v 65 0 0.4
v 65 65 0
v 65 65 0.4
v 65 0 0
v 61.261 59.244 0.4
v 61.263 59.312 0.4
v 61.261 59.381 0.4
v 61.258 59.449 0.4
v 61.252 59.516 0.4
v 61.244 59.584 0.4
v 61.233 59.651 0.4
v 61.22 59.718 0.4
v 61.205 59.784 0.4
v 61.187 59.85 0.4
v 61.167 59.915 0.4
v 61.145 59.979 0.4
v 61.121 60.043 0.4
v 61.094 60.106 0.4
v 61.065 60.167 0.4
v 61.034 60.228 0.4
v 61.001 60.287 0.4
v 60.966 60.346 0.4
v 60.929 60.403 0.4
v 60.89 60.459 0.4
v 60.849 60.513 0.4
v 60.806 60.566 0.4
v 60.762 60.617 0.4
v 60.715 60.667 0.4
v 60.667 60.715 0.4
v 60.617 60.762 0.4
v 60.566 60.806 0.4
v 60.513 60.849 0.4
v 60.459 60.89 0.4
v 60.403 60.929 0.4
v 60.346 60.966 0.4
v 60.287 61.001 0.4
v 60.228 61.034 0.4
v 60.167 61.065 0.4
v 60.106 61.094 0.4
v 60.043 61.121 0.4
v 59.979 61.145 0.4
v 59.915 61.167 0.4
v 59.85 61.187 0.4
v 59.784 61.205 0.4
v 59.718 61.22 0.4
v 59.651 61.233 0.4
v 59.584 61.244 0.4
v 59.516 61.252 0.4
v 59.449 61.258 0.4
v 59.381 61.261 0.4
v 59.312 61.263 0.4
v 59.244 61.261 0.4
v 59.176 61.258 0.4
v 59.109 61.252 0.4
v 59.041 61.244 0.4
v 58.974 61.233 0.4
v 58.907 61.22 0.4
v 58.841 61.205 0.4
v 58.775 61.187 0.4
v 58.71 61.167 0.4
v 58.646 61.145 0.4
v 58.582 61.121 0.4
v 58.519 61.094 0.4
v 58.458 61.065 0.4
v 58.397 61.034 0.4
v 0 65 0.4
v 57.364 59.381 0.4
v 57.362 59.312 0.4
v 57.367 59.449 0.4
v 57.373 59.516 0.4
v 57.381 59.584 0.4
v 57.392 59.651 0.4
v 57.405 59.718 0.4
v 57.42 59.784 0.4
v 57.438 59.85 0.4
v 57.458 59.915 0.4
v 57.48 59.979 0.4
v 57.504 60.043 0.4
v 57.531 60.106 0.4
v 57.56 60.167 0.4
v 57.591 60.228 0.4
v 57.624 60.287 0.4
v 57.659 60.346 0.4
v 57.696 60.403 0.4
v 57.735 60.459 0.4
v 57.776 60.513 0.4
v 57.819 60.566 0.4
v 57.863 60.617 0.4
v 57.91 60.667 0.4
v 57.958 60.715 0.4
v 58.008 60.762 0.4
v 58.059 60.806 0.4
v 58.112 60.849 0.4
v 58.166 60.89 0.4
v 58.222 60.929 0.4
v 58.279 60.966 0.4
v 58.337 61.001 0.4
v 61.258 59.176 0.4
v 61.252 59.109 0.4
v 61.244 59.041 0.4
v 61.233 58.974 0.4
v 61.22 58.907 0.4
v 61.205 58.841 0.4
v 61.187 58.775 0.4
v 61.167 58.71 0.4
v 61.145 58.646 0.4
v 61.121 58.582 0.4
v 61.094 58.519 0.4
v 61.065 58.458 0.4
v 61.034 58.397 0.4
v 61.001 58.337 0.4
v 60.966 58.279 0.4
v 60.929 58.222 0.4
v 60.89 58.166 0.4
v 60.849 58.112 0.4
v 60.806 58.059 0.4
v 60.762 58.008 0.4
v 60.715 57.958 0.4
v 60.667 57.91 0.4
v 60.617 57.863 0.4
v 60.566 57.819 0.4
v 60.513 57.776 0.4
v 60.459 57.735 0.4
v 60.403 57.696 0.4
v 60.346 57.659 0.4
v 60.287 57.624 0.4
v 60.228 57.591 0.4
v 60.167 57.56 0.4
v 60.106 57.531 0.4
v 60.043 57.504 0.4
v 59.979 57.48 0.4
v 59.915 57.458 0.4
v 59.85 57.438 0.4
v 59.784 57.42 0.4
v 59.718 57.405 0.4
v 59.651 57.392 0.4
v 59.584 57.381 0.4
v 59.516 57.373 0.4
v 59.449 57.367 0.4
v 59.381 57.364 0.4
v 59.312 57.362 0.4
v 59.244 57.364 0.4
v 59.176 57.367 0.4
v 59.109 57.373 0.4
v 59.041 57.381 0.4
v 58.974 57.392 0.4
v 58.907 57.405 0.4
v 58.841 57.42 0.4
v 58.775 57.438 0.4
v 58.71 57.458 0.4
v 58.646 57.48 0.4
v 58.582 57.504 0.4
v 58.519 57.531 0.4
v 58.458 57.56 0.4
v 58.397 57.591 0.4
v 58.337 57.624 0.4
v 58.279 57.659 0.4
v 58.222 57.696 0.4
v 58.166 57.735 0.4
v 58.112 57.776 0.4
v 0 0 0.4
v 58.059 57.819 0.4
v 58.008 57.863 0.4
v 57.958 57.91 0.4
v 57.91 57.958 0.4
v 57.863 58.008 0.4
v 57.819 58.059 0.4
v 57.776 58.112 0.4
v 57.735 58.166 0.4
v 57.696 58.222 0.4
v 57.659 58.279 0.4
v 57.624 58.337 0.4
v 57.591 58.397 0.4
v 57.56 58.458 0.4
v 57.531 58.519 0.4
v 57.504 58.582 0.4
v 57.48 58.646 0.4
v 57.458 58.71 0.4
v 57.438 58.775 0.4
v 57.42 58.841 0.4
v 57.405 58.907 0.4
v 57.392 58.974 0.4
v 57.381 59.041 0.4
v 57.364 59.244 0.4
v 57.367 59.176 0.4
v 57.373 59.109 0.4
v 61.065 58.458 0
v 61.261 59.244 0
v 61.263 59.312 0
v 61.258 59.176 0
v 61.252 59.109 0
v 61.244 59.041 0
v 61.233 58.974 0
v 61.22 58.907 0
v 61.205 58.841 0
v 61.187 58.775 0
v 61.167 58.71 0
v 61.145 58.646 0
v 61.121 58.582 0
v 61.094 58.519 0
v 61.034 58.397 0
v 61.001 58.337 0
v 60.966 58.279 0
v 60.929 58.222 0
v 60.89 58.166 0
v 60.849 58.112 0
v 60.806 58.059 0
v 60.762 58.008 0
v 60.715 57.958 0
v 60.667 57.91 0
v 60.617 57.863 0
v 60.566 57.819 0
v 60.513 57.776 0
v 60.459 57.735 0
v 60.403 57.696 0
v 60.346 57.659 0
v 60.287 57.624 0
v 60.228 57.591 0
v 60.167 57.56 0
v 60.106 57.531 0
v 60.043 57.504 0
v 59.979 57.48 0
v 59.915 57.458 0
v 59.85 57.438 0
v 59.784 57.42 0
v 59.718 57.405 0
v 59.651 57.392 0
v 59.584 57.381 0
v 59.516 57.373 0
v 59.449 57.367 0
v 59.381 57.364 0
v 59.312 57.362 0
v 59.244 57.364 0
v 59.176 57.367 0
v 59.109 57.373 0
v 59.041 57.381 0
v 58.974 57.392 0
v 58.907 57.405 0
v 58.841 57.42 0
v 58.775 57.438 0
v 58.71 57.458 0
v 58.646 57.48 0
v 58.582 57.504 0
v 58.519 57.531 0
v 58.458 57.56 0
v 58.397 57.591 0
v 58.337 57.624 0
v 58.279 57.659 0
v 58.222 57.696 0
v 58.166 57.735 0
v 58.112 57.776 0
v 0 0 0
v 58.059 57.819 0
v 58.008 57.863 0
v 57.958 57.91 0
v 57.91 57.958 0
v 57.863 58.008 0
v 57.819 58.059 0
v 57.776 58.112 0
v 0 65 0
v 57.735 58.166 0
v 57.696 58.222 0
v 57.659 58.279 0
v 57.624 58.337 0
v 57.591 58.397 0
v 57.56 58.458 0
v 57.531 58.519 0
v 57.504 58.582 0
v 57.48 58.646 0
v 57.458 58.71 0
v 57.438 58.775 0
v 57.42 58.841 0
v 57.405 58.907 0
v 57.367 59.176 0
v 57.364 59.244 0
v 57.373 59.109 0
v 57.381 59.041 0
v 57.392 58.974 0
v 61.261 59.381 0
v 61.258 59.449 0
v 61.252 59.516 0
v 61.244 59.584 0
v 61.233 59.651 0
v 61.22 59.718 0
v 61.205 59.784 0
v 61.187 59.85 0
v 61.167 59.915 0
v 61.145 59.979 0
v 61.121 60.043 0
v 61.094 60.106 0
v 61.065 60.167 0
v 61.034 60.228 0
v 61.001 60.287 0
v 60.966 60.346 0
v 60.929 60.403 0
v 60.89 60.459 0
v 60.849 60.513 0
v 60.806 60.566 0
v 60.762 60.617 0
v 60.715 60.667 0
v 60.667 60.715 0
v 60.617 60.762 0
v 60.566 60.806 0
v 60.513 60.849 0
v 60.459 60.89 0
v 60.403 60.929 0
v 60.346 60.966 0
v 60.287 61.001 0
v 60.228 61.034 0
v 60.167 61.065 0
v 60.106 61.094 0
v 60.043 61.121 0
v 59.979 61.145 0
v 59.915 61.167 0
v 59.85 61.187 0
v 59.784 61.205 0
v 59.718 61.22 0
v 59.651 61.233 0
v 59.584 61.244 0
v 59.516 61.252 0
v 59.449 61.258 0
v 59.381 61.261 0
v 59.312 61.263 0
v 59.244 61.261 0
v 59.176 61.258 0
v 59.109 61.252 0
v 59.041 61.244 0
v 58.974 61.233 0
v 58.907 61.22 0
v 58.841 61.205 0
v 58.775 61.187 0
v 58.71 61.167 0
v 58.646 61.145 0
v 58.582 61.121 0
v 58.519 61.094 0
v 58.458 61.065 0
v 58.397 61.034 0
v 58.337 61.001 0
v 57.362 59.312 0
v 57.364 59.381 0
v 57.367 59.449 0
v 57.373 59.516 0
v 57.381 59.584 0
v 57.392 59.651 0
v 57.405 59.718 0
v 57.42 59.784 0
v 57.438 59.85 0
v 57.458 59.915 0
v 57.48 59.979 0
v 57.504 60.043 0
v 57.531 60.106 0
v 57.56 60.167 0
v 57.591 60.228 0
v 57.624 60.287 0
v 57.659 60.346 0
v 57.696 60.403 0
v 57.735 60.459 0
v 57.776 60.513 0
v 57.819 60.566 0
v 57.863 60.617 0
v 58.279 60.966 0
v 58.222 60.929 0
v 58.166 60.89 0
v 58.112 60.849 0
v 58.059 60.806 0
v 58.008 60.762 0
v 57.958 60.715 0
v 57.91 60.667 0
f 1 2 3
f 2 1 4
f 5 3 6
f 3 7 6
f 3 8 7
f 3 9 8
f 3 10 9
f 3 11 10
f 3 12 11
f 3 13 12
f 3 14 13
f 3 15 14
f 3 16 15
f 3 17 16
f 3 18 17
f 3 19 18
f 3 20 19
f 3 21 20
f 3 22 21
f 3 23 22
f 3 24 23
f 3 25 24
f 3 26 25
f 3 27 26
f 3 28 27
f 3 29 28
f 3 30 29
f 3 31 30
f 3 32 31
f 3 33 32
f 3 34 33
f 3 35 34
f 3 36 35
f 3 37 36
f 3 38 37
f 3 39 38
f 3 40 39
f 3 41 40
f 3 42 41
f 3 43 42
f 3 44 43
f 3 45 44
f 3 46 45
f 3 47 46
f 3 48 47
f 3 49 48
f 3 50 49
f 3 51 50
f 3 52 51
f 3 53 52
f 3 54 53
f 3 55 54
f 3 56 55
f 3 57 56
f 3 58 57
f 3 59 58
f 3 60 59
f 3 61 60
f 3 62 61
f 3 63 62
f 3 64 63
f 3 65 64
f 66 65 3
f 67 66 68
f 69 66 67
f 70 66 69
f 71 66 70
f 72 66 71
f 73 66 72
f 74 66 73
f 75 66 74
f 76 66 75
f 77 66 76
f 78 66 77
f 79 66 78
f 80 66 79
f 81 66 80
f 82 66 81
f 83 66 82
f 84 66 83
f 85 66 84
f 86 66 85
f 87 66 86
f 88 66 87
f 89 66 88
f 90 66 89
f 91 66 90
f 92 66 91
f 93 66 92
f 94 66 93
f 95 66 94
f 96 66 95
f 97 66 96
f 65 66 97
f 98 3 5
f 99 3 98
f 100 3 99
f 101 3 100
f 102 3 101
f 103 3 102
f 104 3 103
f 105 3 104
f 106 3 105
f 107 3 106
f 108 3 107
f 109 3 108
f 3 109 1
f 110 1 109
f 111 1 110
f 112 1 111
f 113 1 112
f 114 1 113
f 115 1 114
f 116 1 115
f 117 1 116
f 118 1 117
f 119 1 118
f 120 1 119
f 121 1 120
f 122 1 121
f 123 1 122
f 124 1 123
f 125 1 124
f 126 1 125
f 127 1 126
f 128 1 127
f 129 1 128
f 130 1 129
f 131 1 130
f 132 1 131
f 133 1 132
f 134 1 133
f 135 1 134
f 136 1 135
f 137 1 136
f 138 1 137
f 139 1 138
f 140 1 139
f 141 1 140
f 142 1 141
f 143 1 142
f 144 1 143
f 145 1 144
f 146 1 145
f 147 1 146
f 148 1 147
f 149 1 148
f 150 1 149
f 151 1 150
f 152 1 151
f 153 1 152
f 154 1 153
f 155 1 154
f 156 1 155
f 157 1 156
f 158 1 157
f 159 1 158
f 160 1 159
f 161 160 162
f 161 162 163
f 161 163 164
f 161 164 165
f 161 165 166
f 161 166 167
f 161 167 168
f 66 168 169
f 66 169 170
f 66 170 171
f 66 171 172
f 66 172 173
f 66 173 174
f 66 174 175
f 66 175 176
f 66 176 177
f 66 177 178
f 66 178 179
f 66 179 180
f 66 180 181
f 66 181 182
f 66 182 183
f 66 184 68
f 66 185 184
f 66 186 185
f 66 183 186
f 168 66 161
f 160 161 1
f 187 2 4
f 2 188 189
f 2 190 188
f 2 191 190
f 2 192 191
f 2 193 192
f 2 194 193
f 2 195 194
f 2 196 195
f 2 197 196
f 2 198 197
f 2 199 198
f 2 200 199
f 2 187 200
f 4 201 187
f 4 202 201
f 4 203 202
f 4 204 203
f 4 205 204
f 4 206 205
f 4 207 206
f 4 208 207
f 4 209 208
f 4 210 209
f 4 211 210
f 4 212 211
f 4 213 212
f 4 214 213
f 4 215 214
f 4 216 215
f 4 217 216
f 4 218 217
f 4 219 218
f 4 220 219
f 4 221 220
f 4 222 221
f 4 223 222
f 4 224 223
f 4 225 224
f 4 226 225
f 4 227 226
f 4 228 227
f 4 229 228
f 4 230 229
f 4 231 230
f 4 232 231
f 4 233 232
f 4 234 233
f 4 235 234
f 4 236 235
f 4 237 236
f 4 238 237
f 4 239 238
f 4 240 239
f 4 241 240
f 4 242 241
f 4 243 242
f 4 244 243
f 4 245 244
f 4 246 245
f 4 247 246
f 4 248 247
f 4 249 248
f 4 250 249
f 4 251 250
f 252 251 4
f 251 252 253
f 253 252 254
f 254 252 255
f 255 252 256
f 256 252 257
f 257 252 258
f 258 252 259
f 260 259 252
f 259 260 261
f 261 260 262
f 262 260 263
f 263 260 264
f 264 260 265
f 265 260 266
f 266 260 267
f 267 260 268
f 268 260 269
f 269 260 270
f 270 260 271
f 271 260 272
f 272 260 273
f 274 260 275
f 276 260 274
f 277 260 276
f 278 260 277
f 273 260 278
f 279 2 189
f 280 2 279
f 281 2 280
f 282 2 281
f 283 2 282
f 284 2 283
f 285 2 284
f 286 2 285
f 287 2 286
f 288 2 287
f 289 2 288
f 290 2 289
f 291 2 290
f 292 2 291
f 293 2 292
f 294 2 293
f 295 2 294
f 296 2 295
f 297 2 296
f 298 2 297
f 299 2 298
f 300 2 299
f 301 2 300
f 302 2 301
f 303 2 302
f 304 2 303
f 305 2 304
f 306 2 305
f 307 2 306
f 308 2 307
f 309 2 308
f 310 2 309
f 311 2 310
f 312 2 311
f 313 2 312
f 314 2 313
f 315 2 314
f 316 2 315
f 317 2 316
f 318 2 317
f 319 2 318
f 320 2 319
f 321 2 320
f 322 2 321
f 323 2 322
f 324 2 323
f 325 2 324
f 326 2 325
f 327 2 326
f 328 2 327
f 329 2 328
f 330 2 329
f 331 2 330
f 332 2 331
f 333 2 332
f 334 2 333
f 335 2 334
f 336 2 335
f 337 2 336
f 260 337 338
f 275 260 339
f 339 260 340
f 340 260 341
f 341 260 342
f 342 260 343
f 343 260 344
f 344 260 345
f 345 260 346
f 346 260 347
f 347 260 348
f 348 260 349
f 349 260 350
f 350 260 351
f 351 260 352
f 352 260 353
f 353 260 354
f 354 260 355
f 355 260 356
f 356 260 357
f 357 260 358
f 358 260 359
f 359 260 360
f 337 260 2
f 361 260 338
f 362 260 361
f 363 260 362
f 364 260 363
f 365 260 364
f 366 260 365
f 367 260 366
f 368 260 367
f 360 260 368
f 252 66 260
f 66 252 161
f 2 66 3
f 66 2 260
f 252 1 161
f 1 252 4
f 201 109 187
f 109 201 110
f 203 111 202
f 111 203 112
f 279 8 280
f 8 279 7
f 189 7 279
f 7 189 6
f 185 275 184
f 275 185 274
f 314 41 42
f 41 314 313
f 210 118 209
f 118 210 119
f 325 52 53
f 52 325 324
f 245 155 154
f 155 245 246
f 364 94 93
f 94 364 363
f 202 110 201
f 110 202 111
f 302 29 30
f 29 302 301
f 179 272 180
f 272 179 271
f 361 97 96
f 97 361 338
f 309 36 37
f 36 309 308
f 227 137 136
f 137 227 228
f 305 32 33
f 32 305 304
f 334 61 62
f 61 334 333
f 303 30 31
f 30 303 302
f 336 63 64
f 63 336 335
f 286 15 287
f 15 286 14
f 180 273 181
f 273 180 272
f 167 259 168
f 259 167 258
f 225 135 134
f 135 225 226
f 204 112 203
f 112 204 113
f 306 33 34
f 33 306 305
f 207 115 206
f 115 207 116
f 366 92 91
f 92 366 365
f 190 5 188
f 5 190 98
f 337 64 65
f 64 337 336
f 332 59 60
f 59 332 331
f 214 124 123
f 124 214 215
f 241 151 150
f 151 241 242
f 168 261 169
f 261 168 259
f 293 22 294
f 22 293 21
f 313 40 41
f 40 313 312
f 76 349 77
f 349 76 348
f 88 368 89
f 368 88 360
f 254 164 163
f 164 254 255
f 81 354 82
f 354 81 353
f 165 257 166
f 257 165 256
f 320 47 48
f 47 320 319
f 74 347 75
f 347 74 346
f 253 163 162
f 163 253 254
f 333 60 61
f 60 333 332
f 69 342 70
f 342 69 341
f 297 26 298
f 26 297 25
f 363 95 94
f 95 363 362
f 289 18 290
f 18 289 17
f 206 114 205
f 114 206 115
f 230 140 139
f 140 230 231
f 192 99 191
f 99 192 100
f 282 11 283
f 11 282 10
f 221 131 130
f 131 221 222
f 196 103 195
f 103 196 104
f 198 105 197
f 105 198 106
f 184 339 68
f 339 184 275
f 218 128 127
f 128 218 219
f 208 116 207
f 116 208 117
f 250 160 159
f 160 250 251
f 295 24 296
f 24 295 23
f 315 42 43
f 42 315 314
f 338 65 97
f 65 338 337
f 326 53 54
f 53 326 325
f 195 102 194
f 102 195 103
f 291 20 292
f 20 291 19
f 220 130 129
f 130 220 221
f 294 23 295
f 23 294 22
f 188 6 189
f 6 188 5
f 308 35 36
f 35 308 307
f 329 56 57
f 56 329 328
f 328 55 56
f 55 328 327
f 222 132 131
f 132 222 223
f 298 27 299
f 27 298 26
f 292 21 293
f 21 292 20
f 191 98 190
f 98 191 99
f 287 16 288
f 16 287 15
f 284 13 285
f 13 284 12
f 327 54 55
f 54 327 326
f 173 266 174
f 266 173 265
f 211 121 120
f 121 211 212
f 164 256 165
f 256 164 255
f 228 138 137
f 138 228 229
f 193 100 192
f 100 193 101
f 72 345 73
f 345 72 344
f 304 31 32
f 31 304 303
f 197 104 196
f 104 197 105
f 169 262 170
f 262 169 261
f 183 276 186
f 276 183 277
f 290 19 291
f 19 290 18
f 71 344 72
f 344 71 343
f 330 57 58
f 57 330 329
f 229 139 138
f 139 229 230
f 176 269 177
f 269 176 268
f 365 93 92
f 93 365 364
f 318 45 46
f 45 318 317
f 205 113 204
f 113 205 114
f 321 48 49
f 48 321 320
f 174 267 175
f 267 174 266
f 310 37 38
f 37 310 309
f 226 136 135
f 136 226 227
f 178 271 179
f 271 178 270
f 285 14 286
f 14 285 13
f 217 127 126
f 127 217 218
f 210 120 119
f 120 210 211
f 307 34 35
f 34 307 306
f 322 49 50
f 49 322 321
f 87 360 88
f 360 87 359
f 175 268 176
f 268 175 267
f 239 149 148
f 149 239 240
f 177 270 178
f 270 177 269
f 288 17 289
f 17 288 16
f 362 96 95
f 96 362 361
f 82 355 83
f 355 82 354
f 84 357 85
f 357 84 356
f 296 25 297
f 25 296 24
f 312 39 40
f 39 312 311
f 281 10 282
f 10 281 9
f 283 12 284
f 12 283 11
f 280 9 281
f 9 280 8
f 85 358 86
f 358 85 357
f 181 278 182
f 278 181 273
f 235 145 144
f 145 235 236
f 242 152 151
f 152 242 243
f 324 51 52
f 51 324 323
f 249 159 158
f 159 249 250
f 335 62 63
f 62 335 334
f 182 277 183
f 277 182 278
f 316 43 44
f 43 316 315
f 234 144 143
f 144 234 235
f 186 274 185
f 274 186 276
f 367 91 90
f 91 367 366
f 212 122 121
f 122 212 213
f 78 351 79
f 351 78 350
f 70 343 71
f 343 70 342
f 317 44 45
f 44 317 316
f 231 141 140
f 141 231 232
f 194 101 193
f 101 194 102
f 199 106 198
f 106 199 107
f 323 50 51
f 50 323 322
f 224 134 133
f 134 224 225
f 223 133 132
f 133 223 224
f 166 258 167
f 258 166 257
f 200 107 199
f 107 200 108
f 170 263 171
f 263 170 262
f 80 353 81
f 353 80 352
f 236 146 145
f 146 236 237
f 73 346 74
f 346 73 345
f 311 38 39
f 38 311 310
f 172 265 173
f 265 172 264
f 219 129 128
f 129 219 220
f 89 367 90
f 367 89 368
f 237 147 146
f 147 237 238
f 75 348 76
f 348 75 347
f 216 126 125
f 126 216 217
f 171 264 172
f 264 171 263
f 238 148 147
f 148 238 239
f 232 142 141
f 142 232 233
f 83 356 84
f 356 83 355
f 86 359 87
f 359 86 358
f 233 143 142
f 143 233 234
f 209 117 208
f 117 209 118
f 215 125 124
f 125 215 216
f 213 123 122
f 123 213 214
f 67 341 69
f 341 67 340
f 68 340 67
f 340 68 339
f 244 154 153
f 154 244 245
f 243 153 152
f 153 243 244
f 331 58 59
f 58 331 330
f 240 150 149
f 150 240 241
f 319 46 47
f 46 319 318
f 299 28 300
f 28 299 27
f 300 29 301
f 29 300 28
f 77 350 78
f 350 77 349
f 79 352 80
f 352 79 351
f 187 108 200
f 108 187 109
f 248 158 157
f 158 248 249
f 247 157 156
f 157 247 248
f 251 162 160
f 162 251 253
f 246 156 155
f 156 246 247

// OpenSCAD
/*
 * (C) 2017 by Pascal Bauermeister.
 * License: Creative Commons Attribution-NonCommercial-ShareAlike 2.5.
 *
 * Greeting card.
 *
 * 2D vector files used as card base and bmp map.
  */
  

$fn = 180;

SIZE = 80;

module base(thickness) {
    difference() {
        cube([SIZE, SIZE, thickness]);
        translate([73, 73, 0]) cylinder( 20, 2.4, 2.4,true);
    }
}

scale([6.5/8, 6.5/8, 1]) {
    difference() {
        base(0.4);
        
        translate([0, 0, -0.5])
        linear_extrude(h=1) 
        scale([10, 10, 1])
        import("Roger.dxf");
    }
}
